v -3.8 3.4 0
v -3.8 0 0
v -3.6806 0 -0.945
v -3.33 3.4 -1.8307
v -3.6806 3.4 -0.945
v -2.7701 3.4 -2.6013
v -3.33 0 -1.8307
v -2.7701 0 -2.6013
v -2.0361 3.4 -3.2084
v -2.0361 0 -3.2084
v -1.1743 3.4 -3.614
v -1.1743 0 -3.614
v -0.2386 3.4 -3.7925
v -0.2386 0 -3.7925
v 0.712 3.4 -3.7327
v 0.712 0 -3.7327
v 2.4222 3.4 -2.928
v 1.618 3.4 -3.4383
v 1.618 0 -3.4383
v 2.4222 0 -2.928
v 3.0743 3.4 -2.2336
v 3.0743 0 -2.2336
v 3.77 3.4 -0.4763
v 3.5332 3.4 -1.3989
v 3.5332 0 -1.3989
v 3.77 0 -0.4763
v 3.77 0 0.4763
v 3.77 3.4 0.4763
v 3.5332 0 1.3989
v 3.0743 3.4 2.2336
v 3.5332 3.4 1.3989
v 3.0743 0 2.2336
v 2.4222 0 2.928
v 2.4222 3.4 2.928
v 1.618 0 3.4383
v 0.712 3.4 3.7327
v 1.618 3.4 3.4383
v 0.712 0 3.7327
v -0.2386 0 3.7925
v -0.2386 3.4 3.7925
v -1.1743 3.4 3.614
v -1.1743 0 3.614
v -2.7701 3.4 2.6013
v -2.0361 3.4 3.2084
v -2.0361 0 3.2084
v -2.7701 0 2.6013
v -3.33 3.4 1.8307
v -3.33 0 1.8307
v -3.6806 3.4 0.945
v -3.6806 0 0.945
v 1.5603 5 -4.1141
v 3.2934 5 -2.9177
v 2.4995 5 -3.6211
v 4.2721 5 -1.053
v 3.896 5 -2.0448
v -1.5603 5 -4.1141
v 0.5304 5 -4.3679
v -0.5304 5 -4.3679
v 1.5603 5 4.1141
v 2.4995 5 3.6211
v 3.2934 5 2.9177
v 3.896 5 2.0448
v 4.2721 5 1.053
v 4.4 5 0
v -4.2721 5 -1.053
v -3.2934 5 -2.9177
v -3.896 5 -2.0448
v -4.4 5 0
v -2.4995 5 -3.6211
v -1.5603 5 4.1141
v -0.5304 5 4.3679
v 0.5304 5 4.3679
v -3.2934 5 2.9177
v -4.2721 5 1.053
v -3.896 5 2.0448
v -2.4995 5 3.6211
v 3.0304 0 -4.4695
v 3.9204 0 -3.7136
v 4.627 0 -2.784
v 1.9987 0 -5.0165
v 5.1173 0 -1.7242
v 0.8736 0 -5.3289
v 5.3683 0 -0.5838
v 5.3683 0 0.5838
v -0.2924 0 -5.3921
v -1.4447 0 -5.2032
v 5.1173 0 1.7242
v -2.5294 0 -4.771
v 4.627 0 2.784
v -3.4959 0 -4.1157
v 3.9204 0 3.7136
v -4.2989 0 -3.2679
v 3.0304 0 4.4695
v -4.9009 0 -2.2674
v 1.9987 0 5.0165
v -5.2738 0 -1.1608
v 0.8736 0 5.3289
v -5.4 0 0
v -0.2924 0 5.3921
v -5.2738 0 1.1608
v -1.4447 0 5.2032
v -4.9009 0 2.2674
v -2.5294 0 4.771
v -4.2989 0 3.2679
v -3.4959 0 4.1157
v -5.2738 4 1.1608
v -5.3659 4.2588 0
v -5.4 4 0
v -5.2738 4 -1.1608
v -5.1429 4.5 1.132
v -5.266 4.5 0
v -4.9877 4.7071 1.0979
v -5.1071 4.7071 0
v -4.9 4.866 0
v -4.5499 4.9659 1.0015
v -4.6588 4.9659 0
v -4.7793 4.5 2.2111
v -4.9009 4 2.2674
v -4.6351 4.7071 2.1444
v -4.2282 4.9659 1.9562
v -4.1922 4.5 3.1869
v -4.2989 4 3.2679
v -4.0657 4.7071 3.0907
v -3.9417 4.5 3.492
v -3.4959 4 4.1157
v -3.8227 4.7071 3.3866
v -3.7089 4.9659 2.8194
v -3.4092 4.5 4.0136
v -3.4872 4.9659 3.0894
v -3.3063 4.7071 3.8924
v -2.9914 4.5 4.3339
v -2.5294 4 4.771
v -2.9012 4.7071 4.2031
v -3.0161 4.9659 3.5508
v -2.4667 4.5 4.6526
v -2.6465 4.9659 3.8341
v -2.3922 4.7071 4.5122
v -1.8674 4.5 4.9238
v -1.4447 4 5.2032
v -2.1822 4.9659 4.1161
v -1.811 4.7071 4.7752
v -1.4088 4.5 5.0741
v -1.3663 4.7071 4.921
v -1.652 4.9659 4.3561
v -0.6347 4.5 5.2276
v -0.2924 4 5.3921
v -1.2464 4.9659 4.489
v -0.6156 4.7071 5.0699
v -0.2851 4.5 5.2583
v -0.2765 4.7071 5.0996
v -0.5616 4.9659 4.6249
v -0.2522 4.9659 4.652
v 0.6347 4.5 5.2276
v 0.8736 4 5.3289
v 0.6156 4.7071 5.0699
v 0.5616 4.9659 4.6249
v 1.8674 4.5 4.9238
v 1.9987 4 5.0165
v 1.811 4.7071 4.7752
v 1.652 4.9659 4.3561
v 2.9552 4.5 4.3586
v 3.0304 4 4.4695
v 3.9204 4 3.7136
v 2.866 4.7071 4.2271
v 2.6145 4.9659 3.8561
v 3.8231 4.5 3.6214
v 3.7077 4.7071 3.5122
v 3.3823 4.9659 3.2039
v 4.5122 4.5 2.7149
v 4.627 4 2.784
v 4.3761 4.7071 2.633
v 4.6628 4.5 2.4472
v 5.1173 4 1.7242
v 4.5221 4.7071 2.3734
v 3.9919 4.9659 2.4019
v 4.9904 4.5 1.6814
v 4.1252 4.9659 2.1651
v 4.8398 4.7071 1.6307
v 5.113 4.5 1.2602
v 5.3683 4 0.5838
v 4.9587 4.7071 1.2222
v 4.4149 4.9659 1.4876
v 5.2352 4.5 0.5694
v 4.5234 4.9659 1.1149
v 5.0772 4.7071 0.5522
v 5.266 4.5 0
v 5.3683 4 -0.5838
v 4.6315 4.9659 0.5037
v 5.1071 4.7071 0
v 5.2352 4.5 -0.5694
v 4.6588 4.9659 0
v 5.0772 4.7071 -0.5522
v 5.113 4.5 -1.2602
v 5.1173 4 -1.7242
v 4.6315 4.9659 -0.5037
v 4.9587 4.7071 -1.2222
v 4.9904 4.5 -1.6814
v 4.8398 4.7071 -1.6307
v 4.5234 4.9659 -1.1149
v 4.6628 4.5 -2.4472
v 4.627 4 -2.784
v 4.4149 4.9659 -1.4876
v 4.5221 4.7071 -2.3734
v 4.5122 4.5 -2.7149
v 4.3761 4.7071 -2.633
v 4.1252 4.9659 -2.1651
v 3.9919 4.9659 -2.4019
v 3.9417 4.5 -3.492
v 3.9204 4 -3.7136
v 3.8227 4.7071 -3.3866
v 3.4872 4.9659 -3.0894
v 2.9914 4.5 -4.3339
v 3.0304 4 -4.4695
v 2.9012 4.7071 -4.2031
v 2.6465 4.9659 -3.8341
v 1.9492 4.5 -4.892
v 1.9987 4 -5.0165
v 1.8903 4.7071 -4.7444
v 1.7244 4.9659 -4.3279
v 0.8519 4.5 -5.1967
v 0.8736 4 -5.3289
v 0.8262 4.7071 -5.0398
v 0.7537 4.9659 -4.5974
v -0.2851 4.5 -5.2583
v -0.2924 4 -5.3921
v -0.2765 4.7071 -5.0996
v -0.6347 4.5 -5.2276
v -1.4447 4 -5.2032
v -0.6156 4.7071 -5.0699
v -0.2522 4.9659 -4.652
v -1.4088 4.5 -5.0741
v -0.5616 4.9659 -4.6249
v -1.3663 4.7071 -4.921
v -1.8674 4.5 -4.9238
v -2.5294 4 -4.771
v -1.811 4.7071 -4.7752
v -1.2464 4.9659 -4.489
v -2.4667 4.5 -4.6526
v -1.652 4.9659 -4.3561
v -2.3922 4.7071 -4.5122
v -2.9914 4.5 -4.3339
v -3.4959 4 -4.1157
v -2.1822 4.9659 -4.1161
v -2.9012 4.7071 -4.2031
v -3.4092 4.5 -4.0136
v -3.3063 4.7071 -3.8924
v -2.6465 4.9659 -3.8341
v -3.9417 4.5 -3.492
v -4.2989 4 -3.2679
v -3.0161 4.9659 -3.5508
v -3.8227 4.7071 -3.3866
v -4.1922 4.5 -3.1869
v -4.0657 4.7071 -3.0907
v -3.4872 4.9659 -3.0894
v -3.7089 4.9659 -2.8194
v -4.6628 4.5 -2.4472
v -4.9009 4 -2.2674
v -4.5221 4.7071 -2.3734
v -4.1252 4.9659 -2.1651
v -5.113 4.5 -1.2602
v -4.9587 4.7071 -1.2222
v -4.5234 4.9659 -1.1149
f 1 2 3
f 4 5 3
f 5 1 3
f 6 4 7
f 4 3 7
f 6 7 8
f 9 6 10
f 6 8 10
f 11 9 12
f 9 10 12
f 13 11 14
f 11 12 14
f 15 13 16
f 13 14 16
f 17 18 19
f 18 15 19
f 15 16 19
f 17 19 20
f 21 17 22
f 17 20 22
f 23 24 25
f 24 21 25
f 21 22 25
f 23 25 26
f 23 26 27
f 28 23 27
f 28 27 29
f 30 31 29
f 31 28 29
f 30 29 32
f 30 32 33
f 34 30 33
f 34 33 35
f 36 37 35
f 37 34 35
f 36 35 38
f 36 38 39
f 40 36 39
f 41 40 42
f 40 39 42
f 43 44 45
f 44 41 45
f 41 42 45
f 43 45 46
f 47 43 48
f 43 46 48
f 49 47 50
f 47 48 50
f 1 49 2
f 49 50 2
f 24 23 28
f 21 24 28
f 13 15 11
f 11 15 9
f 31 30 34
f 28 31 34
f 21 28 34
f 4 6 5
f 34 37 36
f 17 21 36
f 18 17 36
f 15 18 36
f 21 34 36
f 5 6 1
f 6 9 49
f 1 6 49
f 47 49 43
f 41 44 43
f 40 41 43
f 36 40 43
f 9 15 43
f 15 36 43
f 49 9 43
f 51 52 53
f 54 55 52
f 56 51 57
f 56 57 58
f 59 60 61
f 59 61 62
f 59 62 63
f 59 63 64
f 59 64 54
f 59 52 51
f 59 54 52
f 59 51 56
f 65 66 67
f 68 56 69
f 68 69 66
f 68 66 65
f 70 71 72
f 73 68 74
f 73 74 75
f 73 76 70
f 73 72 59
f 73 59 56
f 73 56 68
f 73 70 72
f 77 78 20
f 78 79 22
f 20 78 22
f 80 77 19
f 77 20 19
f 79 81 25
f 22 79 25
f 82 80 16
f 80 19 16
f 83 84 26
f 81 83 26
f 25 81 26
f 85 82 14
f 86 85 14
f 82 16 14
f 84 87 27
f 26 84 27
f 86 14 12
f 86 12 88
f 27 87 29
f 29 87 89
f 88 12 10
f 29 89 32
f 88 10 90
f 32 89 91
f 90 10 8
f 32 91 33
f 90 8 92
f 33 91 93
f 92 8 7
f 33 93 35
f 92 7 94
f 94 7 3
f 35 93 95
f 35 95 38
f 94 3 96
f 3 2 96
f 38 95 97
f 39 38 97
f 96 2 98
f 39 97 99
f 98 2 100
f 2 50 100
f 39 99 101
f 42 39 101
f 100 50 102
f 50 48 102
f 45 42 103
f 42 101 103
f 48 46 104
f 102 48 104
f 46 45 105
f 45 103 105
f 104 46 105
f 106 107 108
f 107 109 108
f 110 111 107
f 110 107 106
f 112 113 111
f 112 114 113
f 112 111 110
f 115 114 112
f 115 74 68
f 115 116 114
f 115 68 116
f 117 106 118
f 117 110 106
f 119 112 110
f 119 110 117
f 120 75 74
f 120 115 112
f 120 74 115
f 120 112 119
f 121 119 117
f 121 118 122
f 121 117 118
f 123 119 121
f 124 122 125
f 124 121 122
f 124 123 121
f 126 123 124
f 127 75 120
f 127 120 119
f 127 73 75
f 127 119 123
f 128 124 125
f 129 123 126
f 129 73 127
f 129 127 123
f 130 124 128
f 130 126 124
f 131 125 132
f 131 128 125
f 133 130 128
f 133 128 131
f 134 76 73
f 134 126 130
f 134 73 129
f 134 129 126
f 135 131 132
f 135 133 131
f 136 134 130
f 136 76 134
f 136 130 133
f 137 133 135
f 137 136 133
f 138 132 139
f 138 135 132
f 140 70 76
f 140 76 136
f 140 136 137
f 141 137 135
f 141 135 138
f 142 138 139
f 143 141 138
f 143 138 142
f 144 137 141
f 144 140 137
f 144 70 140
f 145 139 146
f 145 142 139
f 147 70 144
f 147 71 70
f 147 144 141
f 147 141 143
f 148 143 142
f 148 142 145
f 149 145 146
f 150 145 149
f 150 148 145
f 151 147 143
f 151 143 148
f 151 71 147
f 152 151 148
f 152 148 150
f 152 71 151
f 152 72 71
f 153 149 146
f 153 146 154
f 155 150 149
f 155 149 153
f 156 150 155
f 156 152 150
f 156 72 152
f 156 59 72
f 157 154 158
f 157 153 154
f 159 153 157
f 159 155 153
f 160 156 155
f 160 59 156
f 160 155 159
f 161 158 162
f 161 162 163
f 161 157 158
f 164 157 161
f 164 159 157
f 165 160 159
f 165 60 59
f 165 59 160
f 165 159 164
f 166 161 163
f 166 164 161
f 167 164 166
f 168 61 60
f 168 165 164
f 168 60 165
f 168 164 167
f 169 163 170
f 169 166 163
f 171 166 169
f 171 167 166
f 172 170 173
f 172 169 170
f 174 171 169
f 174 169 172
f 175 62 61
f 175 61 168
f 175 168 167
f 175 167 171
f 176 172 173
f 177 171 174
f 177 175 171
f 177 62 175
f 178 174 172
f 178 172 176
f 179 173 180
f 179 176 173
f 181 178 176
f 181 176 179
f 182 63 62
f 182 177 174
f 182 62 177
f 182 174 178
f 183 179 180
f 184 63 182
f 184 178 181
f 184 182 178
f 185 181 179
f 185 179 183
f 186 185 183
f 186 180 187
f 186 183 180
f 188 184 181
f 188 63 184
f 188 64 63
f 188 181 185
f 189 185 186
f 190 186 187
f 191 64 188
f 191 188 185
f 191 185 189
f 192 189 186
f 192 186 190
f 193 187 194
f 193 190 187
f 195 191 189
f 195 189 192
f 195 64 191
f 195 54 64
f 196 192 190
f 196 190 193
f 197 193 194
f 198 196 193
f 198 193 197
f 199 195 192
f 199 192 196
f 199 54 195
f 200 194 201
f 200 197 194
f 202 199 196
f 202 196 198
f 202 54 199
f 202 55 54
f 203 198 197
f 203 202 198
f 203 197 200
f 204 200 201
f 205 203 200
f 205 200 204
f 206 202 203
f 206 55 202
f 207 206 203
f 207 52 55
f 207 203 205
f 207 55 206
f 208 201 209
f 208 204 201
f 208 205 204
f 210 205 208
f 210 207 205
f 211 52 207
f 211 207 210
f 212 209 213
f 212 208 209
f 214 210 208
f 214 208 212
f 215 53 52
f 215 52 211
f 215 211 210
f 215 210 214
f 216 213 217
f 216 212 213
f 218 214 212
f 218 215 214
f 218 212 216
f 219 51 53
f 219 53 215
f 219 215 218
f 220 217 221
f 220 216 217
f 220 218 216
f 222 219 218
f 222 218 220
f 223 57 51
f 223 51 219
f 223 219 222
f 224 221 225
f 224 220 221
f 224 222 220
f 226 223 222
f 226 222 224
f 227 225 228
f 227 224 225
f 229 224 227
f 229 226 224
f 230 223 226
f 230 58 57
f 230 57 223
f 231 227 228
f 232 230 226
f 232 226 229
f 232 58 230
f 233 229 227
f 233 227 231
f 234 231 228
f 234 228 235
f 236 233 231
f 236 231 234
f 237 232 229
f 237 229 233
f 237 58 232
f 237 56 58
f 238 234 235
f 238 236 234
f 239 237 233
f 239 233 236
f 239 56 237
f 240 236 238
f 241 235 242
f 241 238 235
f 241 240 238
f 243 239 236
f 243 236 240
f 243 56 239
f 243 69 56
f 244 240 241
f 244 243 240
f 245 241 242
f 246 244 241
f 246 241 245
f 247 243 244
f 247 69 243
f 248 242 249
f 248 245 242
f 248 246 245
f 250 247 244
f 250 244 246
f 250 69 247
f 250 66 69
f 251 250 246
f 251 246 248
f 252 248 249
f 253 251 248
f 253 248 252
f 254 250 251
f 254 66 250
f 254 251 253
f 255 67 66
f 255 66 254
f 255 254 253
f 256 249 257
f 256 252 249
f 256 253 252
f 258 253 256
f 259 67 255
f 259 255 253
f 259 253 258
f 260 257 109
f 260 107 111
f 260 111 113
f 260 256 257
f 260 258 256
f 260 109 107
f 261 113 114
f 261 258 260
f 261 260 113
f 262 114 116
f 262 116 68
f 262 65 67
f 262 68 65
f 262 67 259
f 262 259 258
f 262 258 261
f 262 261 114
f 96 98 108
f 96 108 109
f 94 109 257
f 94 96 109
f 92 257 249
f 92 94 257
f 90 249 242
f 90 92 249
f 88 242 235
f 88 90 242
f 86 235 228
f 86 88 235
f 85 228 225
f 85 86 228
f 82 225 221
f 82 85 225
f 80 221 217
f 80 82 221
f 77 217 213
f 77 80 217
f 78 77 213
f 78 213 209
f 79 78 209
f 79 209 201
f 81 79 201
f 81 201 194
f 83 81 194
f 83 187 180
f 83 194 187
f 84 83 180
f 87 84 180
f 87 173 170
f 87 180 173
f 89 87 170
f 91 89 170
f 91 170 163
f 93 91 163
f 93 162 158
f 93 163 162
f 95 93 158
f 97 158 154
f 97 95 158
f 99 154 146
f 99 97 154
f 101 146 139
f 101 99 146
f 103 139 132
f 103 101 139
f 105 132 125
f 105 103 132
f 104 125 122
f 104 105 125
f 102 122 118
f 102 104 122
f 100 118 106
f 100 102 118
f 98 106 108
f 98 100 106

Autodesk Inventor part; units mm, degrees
ref_plane "YZ Plane" through (0, 0, 0) normal (1, 0, 0) x (0, 1, 0)
ref_plane "XZ Plane" through (0, 0, 0) normal (0, 1, 0) x (-1, 0, 0)
ref_plane "XY Plane" through (0, 0, 0) normal (0, 0, 1) x (1, 0, 0)
sketch "스케치1" plane through (0, 0, 0) normal (0, 1, 0) x (-1, 0, 0)
  circle A0 centre (0, 0) radius 3.8
  circle A1 centre (0, 0) radius 5.4
  dimension "d0" = 7.6
  dimension "d1" = 1.6
extrude "돌출1" add sketch "스케치1" along normal blind 5 contours A0 | A1
extrude "돌출2" cut sketch "스케치1" along normal blind 3.4 contours A0
fillet "모깎기1" radius 1 1 edges at (5.4, 5, 0)
properties part number "final_탄두낙하산거치대_스프링고정"
